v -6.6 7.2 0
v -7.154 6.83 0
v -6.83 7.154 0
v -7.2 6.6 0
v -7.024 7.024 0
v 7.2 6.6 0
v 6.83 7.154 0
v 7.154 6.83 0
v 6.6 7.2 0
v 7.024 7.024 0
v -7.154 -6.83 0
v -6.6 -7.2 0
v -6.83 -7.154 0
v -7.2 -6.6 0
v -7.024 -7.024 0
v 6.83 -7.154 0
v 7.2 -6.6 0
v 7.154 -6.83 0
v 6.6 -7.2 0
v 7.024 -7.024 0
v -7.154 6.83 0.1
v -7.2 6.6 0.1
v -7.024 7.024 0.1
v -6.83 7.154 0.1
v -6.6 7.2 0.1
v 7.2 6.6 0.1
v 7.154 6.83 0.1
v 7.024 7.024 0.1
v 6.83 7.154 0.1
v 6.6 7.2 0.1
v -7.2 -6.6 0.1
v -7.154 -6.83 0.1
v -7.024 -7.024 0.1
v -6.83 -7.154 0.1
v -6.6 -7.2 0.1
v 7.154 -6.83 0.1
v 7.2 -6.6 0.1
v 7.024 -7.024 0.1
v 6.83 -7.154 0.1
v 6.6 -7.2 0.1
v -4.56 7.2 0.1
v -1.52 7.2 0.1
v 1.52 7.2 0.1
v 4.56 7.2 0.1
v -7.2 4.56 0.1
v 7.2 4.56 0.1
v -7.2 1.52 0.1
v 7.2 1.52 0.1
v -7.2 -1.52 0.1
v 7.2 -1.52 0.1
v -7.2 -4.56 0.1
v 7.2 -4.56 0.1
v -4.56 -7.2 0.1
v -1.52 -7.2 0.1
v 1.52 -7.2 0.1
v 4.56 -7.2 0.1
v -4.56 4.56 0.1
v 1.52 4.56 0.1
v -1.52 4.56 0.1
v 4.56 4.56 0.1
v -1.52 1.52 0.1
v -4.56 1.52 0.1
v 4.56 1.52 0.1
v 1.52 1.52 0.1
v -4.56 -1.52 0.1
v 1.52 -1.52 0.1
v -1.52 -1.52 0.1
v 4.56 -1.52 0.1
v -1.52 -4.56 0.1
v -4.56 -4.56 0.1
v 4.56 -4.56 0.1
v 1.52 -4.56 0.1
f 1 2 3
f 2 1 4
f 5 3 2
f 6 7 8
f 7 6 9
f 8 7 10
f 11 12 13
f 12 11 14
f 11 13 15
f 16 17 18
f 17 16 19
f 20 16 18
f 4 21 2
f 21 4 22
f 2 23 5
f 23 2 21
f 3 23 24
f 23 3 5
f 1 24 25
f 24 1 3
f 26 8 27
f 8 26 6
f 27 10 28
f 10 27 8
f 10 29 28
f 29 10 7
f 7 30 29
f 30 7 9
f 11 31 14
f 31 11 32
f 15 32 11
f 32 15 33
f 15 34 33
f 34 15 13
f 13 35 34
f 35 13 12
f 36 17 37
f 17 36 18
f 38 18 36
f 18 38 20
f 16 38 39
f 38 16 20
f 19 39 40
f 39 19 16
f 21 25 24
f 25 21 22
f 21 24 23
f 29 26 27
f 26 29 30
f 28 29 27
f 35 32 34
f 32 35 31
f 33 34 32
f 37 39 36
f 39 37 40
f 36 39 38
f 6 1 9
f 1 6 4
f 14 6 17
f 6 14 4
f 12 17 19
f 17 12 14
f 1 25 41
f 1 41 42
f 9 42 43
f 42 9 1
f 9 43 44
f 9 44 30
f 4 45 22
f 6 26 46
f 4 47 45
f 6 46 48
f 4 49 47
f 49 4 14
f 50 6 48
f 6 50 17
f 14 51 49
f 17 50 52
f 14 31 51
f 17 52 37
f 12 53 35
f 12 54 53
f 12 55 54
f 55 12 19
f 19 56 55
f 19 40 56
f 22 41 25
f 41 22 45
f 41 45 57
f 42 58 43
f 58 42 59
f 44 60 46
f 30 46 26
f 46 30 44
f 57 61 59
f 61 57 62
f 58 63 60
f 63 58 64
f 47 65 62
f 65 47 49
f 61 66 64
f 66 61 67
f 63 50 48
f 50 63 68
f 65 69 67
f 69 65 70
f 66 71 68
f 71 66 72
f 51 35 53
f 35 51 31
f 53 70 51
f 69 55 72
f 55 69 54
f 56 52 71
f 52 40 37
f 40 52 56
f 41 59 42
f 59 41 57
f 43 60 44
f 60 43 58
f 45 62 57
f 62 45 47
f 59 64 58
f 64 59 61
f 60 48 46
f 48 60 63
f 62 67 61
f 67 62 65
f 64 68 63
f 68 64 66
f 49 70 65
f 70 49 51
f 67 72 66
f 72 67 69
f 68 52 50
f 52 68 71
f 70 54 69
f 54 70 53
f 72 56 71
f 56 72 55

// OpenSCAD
// file: ../p/1-4cyli.scad
use <../lib.scad>
function ldraw_lib__1_4cyli() = [
// 0 Cylinder 0.25
// 0 Name: 1-4cyli.dat
// 0 Author: James Jessiman
// 0 !LDRAW_ORG Primitive UPDATE 2012-01
// 0 !LICENSE Licensed under CC BY 4.0 : see CAreadme.txt
// 
// 0 BFC CERTIFY CCW
  [0,"BFC","CERTIFY"],
  [0,"BFC","CCW"],
// 
// 0 !HISTORY 2002-03-23 [sbliss] Added BFC statement.
// 0 !HISTORY 2002-04-25 [PTadmin] Official Update 2002-02
// 0 !HISTORY 2007-06-22 [PTadmin] Header formatted for Contributor Agreement
// 0 !HISTORY 2008-07-01 [PTadmin] Official Update 2008-01
// 0 !HISTORY 2012-02-16 [Philo] Changed to CCW
// 0 !HISTORY 2012-03-30 [PTadmin] Official Update 2012-01
// 
// 
// 4 16 1 1 0 0.9239 1 0.3827 0.9239 0 0.3827 1 0 0
  [4,16,1,1,0,0.9239,1,0.3827,0.9239,0,0.3827,1,0,0],
// 5 24 1 0 0 1 1 0 0.9239 0 0.3827 1 0 -1
  [5,24,1,0,0,1,1,0,0.9239,0,0.3827,1,0,-1],
// 4 16 0.9239 1 0.3827 0.7071 1 0.7071 0.7071 0 0.7071 0.9239 0 0.3827
  [4,16,0.9239,1,0.3827,0.7071,1,0.7071,0.7071,0,0.7071,0.9239,0,0.3827],
// 5 24 0.9239 0 0.3827 0.9239 1 0.3827 0.7071 0 0.7071 1 0 0
  [5,24,0.9239,0,0.3827,0.9239,1,0.3827,0.7071,0,0.7071,1,0,0],
// 4 16 0.7071 1 0.7071 0.3827 1 0.9239 0.3827 0 0.9239 0.7071 0 0.7071
  [4,16,0.7071,1,0.7071,0.3827,1,0.9239,0.3827,0,0.9239,0.7071,0,0.7071],
// 5 24 0.7071 0 0.7071 0.7071 1 0.7071 0.3827 0 0.9239 0.9239 0 0.3827
  [5,24,0.7071,0,0.7071,0.7071,1,0.7071,0.3827,0,0.9239,0.9239,0,0.3827],
// 4 16 0.3827 1 0.9239 0 1 1 0 0 1 0.3827 0 0.9239
  [4,16,0.3827,1,0.9239,0,1,1,0,0,1,0.3827,0,0.9239],
// 5 24 0.3827 0 0.9239 0.3827 1 0.9239 0 0 1 0.7071 0 0.7071
  [5,24,0.3827,0,0.9239,0.3827,1,0.9239,0,0,1,0.7071,0,0.7071],
// 5 24 0 0 1 0 1 1 0.3827 0 0.9239 -1 0 1
  [5,24,0,0,1,0,1,1,0.3827,0,0.9239,-1,0,1],
];
module ldraw_lib__1_4cyli(step=0, col=false, unit=2/5, alt=false, line=0.2, solid=!$preview)
    makepoly(ldraw_lib__1_4cyli(), step=step, col=col, unit=unit, alt=alt, line=line, solid=solid);
ldraw_lib__1_4cyli(line=0.2);
// file: ../p/1-4chrd.scad
use <../lib.scad>
function ldraw_lib__1_4chrd() = [
// 0 Chord 0.25
// 0 Name: 1-4chrd.dat
// 0 Author: Max Martin Richter [MMR1988]
// 0 !LDRAW_ORG Primitive UPDATE 2023-05
// 0 !LICENSE Licensed under CC BY 4.0 : see CAreadme.txt
// 
// 0 BFC CERTIFY CCW
  [0,"BFC","CERTIFY"],
  [0,"BFC","CCW"],
// 
// 0 !HISTORY 2004-04-22 [PTadmin] Official Update 2004-02
// 0 !HISTORY 2007-10-09 [PTadmin] Header formatted for Contributor Agreement
// 0 !HISTORY 2008-07-01 [PTadmin] Official Update 2008-01
// 0 !HISTORY 2012-08-02 [MMR1988] Re-creation with PrimGen2 and Rectifier
// 0 !HISTORY 2012-08-09 [PTadmin] Official Update 2012-02
// 0 !HISTORY 2023-10-27 [OrionP] Change author to MMR1988 from hafhead
// 0 !HISTORY 2023-10-31 [OrionP] Official Update 2023-05
// 
// 4 16 0.9239 0 0.3827 0.3827 0 0.9239 0 0 1 1 0 0
  [4,16,0.9239,0,0.3827,0.3827,0,0.9239,0,0,1,1,0,0],
// 3 16 0.7071 0 0.7071 0.3827 0 0.9239 0.9239 0 0.3827
  [3,16,0.7071,0,0.7071,0.3827,0,0.9239,0.9239,0,0.3827],
];
module ldraw_lib__1_4chrd(step=0, col=false, unit=2/5, alt=false, line=0.2, solid=!$preview)
    makepoly(ldraw_lib__1_4chrd(), step=step, col=col, unit=unit, alt=alt, line=line, solid=solid);
ldraw_lib__1_4chrd(line=0.2);
// main file
use <../lib.scad>
use <../p/1-4chrd.scad>
use <../p/1-4cyli.scad>
function ldraw_lib__6177969r() = [
// 0 Sticker  1.8 x  1.8 Chequered
// 0 Name: 6177969r.dat
// 0 Author: Massimo Maso [Sirio]
// 0 !LDRAW_ORG Part UPDATE 2023-06
// 0 !LICENSE Licensed under CC BY 4.0 : see CAreadme.txt
// 
// 0 BFC CERTIFY CCW
  [0,"BFC","CERTIFY"],
  [0,"BFC","CCW"],
// 
// 0 !KEYWORDS 1966, 2016, Bricklink 75881stk01, Brickowl 507382, Ford, GT
// 0 !KEYWORDS Rebrickable 30897, Set 75881, Speed Champions
// 
// 0 !HISTORY 2023-11-19 [OrionP] Official Update 2023-06
// 
// 
// 0 // Primitives
// 1 16 -16.5 0 16.5 -1.5 0 0 0 -1 0 0 0 1.5 1-4chrd.dat
  [1,16,-16.5,0,16.5,-1.5,0,0,0,-1,0,0,0,1.5, ldraw_lib__1_4chrd()],
// 1 16 16.5 0 16.5 1.5 0 0 0 -1 0 0 0 1.5 1-4chrd.dat
  [1,16,16.5,0,16.5,1.5,0,0,0,-1,0,0,0,1.5, ldraw_lib__1_4chrd()],
// 1 16 -16.5 0 -16.5 -1.5 0 0 0 -1 0 0 0 -1.5 1-4chrd.dat
  [1,16,-16.5,0,-16.5,-1.5,0,0,0,-1,0,0,0,-1.5, ldraw_lib__1_4chrd()],
// 1 16 16.5 0 -16.5 1.5 0 0 0 -1 0 0 0 -1.5 1-4chrd.dat
  [1,16,16.5,0,-16.5,1.5,0,0,0,-1,0,0,0,-1.5, ldraw_lib__1_4chrd()],
// 1 16 -16.5 0 16.5 -1.5 0 0 0 -.25 0 0 0 1.5 1-4cyli.dat
  [1,16,-16.5,0,16.5,-1.5,0,0,0,-.25,0,0,0,1.5, ldraw_lib__1_4cyli()],
// 1 16 16.5 0 16.5 1.5 0 0 0 -.25 0 0 0 1.5 1-4cyli.dat
  [1,16,16.5,0,16.5,1.5,0,0,0,-.25,0,0,0,1.5, ldraw_lib__1_4cyli()],
// 1 16 -16.5 0 -16.5 -1.5 0 0 0 -.25 0 0 0 -1.5 1-4cyli.dat
  [1,16,-16.5,0,-16.5,-1.5,0,0,0,-.25,0,0,0,-1.5, ldraw_lib__1_4cyli()],
// 1 16 16.5 0 -16.5 1.5 0 0 0 -.25 0 0 0 -1.5 1-4cyli.dat
  [1,16,16.5,0,-16.5,1.5,0,0,0,-.25,0,0,0,-1.5, ldraw_lib__1_4cyli()],
// 1 0 -16.5 -.25 16.5 -1.5 0 0 0 1 0 0 0 1.5 1-4chrd.dat
  [1,0,-16.5,-.25,16.5,-1.5,0,0,0,1,0,0,0,1.5, ldraw_lib__1_4chrd()],
// 1 0 16.5 -.25 16.5 1.5 0 0 0 1 0 0 0 1.5 1-4chrd.dat
  [1,0,16.5,-.25,16.5,1.5,0,0,0,1,0,0,0,1.5, ldraw_lib__1_4chrd()],
// 1 0 -16.5 -.25 -16.5 -1.5 0 0 0 1 0 0 0 -1.5 1-4chrd.dat
  [1,0,-16.5,-.25,-16.5,-1.5,0,0,0,1,0,0,0,-1.5, ldraw_lib__1_4chrd()],
// 1 0 16.5 -.25 -16.5 1.5 0 0 0 1 0 0 0 -1.5 1-4chrd.dat
  [1,0,16.5,-.25,-16.5,1.5,0,0,0,1,0,0,0,-1.5, ldraw_lib__1_4chrd()],
// 0 // Bottom face
// 4 16 16.5 0 18 18 0 16.5 -18 0 16.5 -16.5 0 18
  [4,16,16.5,0,18,18,0,16.5,-18,0,16.5,-16.5,0,18],
// 4 16 18 0 16.5 18 0 -16.5 -18 0 -16.5 -18 0 16.5
  [4,16,18,0,16.5,18,0,-16.5,-18,0,-16.5,-18,0,16.5],
// 4 16 16.5 0 -18 -16.5 0 -18 -18 0 -16.5 18 0 -16.5
  [4,16,16.5,0,-18,-16.5,0,-18,-18,0,-16.5,18,0,-16.5],
// 0 // Lateral face
// 3 16 -16.5 0 18 -16.5 -.25 18 -11.4 -.25 18
  [3,16,-16.5,0,18,-16.5,-.25,18,-11.4,-.25,18],
// 3 16 -16.5 0 18 -11.4 -.25 18 -3.8 -.25 18
  [3,16,-16.5,0,18,-11.4,-.25,18,-3.8,-.25,18],
// 4 16 -16.5 0 18 -3.8 -.25 18 3.8 -.25 18 16.5 0 18
  [4,16,-16.5,0,18,-3.8,-.25,18,3.8,-.25,18,16.5,0,18],
// 3 16 16.5 0 18 3.8 -.25 18 11.4 -.25 18
  [3,16,16.5,0,18,3.8,-.25,18,11.4,-.25,18],
// 3 16 16.5 0 18 11.4 -.25 18 16.5 -.25 18
  [3,16,16.5,0,18,11.4,-.25,18,16.5,-.25,18],
// 3 16 -18 0 16.5 -18 -.25 11.4 -18 -.25 16.5
  [3,16,-18,0,16.5,-18,-.25,11.4,-18,-.25,16.5],
// 3 16 18 0 16.5 18 -.25 16.5 18 -.25 11.4
  [3,16,18,0,16.5,18,-.25,16.5,18,-.25,11.4],
// 3 16 -18 0 16.5 -18 -.25 3.8 -18 -.25 11.4
  [3,16,-18,0,16.5,-18,-.25,3.8,-18,-.25,11.4],
// 3 16 18 0 16.5 18 -.25 11.4 18 -.25 3.8
  [3,16,18,0,16.5,18,-.25,11.4,18,-.25,3.8],
// 4 16 -18 0 16.5 -18 0 -16.5 -18 -.25 -3.8 -18 -.25 3.8
  [4,16,-18,0,16.5,-18,0,-16.5,-18,-.25,-3.8,-18,-.25,3.8],
// 4 16 18 0 16.5 18 -.25 3.8 18 -.25 -3.8 18 0 -16.5
  [4,16,18,0,16.5,18,-.25,3.8,18,-.25,-3.8,18,0,-16.5],
// 3 16 -18 0 -16.5 -18 -.25 -11.4 -18 -.25 -3.8
  [3,16,-18,0,-16.5,-18,-.25,-11.4,-18,-.25,-3.8],
// 3 16 18 0 -16.5 18 -.25 -3.8 18 -.25 -11.4
  [3,16,18,0,-16.5,18,-.25,-3.8,18,-.25,-11.4],
// 3 16 -18 0 -16.5 -18 -.25 -16.5 -18 -.25 -11.4
  [3,16,-18,0,-16.5,-18,-.25,-16.5,-18,-.25,-11.4],
// 3 16 18 0 -16.5 18 -.25 -11.4 18 -.25 -16.5
  [3,16,18,0,-16.5,18,-.25,-11.4,18,-.25,-16.5],
// 3 16 -16.5 0 -18 -11.4 -.25 -18 -16.5 -.25 -18
  [3,16,-16.5,0,-18,-11.4,-.25,-18,-16.5,-.25,-18],
// 3 16 -16.5 0 -18 -3.8 -.25 -18 -11.4 -.25 -18
  [3,16,-16.5,0,-18,-3.8,-.25,-18,-11.4,-.25,-18],
// 4 16 -16.5 0 -18 16.5 0 -18 3.8 -.25 -18 -3.8 -.25 -18
  [4,16,-16.5,0,-18,16.5,0,-18,3.8,-.25,-18,-3.8,-.25,-18],
// 3 16 16.5 0 -18 11.4 -.25 -18 3.8 -.25 -18
  [3,16,16.5,0,-18,11.4,-.25,-18,3.8,-.25,-18],
// 3 16 16.5 0 -18 16.5 -.25 -18 11.4 -.25 -18
  [3,16,16.5,0,-18,16.5,-.25,-18,11.4,-.25,-18],
// 0 // Top face
// 0 // Black faces
// 4 0 -11.4 -.25 18 -16.5 -.25 18 -18 -.25 16.5 -18 -.25 11.4
  [4,0,-11.4,-.25,18,-16.5,-.25,18,-18,-.25,16.5,-18,-.25,11.4],
// 3 0 -11.4 -.25 18 -18 -.25 11.4 -11.4 -.25 11.4
  [3,0,-11.4,-.25,18,-18,-.25,11.4,-11.4,-.25,11.4],
// 4 0 -3.8 -.25 18 -3.8 -.25 11.4 3.8 -.25 11.4 3.8 -.25 18
  [4,0,-3.8,-.25,18,-3.8,-.25,11.4,3.8,-.25,11.4,3.8,-.25,18],
// 3 0 11.4 -.25 18 11.4 -.25 11.4 18 -.25 11.4
  [3,0,11.4,-.25,18,11.4,-.25,11.4,18,-.25,11.4],
// 4 0 11.4 -.25 18 18 -.25 11.4 18 -.25 16.5 16.5 -.25 18
  [4,0,11.4,-.25,18,18,-.25,11.4,18,-.25,16.5,16.5,-.25,18],
// 4 0 -11.4 -.25 11.4 -11.4 -.25 3.8 -3.8 -.25 3.8 -3.8 -.25 11.4
  [4,0,-11.4,-.25,11.4,-11.4,-.25,3.8,-3.8,-.25,3.8,-3.8,-.25,11.4],
// 4 0 3.8 -.25 11.4 3.8 -.25 3.8 11.4 -.25 3.8 11.4 -.25 11.4
  [4,0,3.8,-.25,11.4,3.8,-.25,3.8,11.4,-.25,3.8,11.4,-.25,11.4],
// 4 0 -18 -.25 3.8 -18 -.25 -3.8 -11.4 -.25 -3.8 -11.4 -.25 3.8
  [4,0,-18,-.25,3.8,-18,-.25,-3.8,-11.4,-.25,-3.8,-11.4,-.25,3.8],
// 4 0 -3.8 -.25 3.8 -3.8 -.25 -3.8 3.8 -.25 -3.8 3.8 -.25 3.8
  [4,0,-3.8,-.25,3.8,-3.8,-.25,-3.8,3.8,-.25,-3.8,3.8,-.25,3.8],
// 4 0 11.4 -.25 3.8 11.4 -.25 -3.8 18 -.25 -3.8 18 -.25 3.8
  [4,0,11.4,-.25,3.8,11.4,-.25,-3.8,18,-.25,-3.8,18,-.25,3.8],
// 4 0 -11.4 -.25 -3.8 -11.4 -.25 -11.4 -3.8 -.25 -11.4 -3.8 -.25 -3.8
  [4,0,-11.4,-.25,-3.8,-11.4,-.25,-11.4,-3.8,-.25,-11.4,-3.8,-.25,-3.8],
// 4 0 3.8 -.25 -3.8 3.8 -.25 -11.4 11.4 -.25 -11.4 11.4 -.25 -3.8
  [4,0,3.8,-.25,-3.8,3.8,-.25,-11.4,11.4,-.25,-11.4,11.4,-.25,-3.8],
// 4 0 -11.4 -.25 -18 -18 -.25 -11.4 -18 -.25 -16.5 -16.5 -.25 -18
  [4,0,-11.4,-.25,-18,-18,-.25,-11.4,-18,-.25,-16.5,-16.5,-.25,-18],
// 3 0 -11.4 -.25 -18 -11.4 -.25 -11.4 -18 -.25 -11.4
  [3,0,-11.4,-.25,-18,-11.4,-.25,-11.4,-18,-.25,-11.4],
// 4 0 -3.8 -.25 -11.4 -3.8 -.25 -18 3.8 -.25 -18 3.8 -.25 -11.4
  [4,0,-3.8,-.25,-11.4,-3.8,-.25,-18,3.8,-.25,-18,3.8,-.25,-11.4],
// 3 0 11.4 -.25 -18 18 -.25 -11.4 11.4 -.25 -11.4
  [3,0,11.4,-.25,-18,18,-.25,-11.4,11.4,-.25,-11.4],
// 4 0 11.4 -.25 -18 16.5 -.25 -18 18 -.25 -16.5 18 -.25 -11.4
  [4,0,11.4,-.25,-18,16.5,-.25,-18,18,-.25,-16.5,18,-.25,-11.4],
// 0 // White faces
// 4 15 -11.4 -.25 18 -11.4 -.25 11.4 -3.8 -.25 11.4 -3.8 -.25 18
  [4,15,-11.4,-.25,18,-11.4,-.25,11.4,-3.8,-.25,11.4,-3.8,-.25,18],
// 4 15 3.8 -.25 18 3.8 -.25 11.4 11.4 -.25 11.4 11.4 -.25 18
  [4,15,3.8,-.25,18,3.8,-.25,11.4,11.4,-.25,11.4,11.4,-.25,18],
// 4 15 -18 -.25 11.4 -18 -.25 3.8 -11.4 -.25 3.8 -11.4 -.25 11.4
  [4,15,-18,-.25,11.4,-18,-.25,3.8,-11.4,-.25,3.8,-11.4,-.25,11.4],
// 4 15 -3.8 -.25 11.4 -3.8 -.25 3.8 3.8 -.25 3.8 3.8 -.25 11.4
  [4,15,-3.8,-.25,11.4,-3.8,-.25,3.8,3.8,-.25,3.8,3.8,-.25,11.4],
// 4 15 11.4 -.25 11.4 11.4 -.25 3.8 18 -.25 3.8 18 -.25 11.4
  [4,15,11.4,-.25,11.4,11.4,-.25,3.8,18,-.25,3.8,18,-.25,11.4],
// 4 15 -11.4 -.25 3.8 -11.4 -.25 -3.8 -3.8 -.25 -3.8 -3.8 -.25 3.8
  [4,15,-11.4,-.25,3.8,-11.4,-.25,-3.8,-3.8,-.25,-3.8,-3.8,-.25,3.8],
// 4 15 3.8 -.25 3.8 3.8 -.25 -3.8 11.4 -.25 -3.8 11.4 -.25 3.8
  [4,15,3.8,-.25,3.8,3.8,-.25,-3.8,11.4,-.25,-3.8,11.4,-.25,3.8],
// 4 15 -18 -.25 -3.8 -18 -.25 -11.4 -11.4 -.25 -11.4 -11.4 -.25 -3.8
  [4,15,-18,-.25,-3.8,-18,-.25,-11.4,-11.4,-.25,-11.4,-11.4,-.25,-3.8],
// 4 15 -3.8 -.25 -3.8 -3.8 -.25 -11.4 3.8 -.25 -11.4 3.8 -.25 -3.8
  [4,15,-3.8,-.25,-3.8,-3.8,-.25,-11.4,3.8,-.25,-11.4,3.8,-.25,-3.8],
// 4 15 11.4 -.25 -3.8 11.4 -.25 -11.4 18 -.25 -11.4 18 -.25 -3.8
  [4,15,11.4,-.25,-3.8,11.4,-.25,-11.4,18,-.25,-11.4,18,-.25,-3.8],
// 4 15 -11.4 -.25 -11.4 -11.4 -.25 -18 -3.8 -.25 -18 -3.8 -.25 -11.4
  [4,15,-11.4,-.25,-11.4,-11.4,-.25,-18,-3.8,-.25,-18,-3.8,-.25,-11.4],
// 4 15 3.8 -.25 -11.4 3.8 -.25 -18 11.4 -.25 -18 11.4 -.25 -11.4
  [4,15,3.8,-.25,-11.4,3.8,-.25,-18,11.4,-.25,-18,11.4,-.25,-11.4],
];
module ldraw_lib__6177969r(step=0, col=false, unit=2/5, alt=false, line=0.2, solid=!$preview)
    makepoly(ldraw_lib__6177969r(), step=step, col=col, unit=unit, alt=alt, line=line, solid=solid);
ldraw_lib__6177969r(line=0.2);
